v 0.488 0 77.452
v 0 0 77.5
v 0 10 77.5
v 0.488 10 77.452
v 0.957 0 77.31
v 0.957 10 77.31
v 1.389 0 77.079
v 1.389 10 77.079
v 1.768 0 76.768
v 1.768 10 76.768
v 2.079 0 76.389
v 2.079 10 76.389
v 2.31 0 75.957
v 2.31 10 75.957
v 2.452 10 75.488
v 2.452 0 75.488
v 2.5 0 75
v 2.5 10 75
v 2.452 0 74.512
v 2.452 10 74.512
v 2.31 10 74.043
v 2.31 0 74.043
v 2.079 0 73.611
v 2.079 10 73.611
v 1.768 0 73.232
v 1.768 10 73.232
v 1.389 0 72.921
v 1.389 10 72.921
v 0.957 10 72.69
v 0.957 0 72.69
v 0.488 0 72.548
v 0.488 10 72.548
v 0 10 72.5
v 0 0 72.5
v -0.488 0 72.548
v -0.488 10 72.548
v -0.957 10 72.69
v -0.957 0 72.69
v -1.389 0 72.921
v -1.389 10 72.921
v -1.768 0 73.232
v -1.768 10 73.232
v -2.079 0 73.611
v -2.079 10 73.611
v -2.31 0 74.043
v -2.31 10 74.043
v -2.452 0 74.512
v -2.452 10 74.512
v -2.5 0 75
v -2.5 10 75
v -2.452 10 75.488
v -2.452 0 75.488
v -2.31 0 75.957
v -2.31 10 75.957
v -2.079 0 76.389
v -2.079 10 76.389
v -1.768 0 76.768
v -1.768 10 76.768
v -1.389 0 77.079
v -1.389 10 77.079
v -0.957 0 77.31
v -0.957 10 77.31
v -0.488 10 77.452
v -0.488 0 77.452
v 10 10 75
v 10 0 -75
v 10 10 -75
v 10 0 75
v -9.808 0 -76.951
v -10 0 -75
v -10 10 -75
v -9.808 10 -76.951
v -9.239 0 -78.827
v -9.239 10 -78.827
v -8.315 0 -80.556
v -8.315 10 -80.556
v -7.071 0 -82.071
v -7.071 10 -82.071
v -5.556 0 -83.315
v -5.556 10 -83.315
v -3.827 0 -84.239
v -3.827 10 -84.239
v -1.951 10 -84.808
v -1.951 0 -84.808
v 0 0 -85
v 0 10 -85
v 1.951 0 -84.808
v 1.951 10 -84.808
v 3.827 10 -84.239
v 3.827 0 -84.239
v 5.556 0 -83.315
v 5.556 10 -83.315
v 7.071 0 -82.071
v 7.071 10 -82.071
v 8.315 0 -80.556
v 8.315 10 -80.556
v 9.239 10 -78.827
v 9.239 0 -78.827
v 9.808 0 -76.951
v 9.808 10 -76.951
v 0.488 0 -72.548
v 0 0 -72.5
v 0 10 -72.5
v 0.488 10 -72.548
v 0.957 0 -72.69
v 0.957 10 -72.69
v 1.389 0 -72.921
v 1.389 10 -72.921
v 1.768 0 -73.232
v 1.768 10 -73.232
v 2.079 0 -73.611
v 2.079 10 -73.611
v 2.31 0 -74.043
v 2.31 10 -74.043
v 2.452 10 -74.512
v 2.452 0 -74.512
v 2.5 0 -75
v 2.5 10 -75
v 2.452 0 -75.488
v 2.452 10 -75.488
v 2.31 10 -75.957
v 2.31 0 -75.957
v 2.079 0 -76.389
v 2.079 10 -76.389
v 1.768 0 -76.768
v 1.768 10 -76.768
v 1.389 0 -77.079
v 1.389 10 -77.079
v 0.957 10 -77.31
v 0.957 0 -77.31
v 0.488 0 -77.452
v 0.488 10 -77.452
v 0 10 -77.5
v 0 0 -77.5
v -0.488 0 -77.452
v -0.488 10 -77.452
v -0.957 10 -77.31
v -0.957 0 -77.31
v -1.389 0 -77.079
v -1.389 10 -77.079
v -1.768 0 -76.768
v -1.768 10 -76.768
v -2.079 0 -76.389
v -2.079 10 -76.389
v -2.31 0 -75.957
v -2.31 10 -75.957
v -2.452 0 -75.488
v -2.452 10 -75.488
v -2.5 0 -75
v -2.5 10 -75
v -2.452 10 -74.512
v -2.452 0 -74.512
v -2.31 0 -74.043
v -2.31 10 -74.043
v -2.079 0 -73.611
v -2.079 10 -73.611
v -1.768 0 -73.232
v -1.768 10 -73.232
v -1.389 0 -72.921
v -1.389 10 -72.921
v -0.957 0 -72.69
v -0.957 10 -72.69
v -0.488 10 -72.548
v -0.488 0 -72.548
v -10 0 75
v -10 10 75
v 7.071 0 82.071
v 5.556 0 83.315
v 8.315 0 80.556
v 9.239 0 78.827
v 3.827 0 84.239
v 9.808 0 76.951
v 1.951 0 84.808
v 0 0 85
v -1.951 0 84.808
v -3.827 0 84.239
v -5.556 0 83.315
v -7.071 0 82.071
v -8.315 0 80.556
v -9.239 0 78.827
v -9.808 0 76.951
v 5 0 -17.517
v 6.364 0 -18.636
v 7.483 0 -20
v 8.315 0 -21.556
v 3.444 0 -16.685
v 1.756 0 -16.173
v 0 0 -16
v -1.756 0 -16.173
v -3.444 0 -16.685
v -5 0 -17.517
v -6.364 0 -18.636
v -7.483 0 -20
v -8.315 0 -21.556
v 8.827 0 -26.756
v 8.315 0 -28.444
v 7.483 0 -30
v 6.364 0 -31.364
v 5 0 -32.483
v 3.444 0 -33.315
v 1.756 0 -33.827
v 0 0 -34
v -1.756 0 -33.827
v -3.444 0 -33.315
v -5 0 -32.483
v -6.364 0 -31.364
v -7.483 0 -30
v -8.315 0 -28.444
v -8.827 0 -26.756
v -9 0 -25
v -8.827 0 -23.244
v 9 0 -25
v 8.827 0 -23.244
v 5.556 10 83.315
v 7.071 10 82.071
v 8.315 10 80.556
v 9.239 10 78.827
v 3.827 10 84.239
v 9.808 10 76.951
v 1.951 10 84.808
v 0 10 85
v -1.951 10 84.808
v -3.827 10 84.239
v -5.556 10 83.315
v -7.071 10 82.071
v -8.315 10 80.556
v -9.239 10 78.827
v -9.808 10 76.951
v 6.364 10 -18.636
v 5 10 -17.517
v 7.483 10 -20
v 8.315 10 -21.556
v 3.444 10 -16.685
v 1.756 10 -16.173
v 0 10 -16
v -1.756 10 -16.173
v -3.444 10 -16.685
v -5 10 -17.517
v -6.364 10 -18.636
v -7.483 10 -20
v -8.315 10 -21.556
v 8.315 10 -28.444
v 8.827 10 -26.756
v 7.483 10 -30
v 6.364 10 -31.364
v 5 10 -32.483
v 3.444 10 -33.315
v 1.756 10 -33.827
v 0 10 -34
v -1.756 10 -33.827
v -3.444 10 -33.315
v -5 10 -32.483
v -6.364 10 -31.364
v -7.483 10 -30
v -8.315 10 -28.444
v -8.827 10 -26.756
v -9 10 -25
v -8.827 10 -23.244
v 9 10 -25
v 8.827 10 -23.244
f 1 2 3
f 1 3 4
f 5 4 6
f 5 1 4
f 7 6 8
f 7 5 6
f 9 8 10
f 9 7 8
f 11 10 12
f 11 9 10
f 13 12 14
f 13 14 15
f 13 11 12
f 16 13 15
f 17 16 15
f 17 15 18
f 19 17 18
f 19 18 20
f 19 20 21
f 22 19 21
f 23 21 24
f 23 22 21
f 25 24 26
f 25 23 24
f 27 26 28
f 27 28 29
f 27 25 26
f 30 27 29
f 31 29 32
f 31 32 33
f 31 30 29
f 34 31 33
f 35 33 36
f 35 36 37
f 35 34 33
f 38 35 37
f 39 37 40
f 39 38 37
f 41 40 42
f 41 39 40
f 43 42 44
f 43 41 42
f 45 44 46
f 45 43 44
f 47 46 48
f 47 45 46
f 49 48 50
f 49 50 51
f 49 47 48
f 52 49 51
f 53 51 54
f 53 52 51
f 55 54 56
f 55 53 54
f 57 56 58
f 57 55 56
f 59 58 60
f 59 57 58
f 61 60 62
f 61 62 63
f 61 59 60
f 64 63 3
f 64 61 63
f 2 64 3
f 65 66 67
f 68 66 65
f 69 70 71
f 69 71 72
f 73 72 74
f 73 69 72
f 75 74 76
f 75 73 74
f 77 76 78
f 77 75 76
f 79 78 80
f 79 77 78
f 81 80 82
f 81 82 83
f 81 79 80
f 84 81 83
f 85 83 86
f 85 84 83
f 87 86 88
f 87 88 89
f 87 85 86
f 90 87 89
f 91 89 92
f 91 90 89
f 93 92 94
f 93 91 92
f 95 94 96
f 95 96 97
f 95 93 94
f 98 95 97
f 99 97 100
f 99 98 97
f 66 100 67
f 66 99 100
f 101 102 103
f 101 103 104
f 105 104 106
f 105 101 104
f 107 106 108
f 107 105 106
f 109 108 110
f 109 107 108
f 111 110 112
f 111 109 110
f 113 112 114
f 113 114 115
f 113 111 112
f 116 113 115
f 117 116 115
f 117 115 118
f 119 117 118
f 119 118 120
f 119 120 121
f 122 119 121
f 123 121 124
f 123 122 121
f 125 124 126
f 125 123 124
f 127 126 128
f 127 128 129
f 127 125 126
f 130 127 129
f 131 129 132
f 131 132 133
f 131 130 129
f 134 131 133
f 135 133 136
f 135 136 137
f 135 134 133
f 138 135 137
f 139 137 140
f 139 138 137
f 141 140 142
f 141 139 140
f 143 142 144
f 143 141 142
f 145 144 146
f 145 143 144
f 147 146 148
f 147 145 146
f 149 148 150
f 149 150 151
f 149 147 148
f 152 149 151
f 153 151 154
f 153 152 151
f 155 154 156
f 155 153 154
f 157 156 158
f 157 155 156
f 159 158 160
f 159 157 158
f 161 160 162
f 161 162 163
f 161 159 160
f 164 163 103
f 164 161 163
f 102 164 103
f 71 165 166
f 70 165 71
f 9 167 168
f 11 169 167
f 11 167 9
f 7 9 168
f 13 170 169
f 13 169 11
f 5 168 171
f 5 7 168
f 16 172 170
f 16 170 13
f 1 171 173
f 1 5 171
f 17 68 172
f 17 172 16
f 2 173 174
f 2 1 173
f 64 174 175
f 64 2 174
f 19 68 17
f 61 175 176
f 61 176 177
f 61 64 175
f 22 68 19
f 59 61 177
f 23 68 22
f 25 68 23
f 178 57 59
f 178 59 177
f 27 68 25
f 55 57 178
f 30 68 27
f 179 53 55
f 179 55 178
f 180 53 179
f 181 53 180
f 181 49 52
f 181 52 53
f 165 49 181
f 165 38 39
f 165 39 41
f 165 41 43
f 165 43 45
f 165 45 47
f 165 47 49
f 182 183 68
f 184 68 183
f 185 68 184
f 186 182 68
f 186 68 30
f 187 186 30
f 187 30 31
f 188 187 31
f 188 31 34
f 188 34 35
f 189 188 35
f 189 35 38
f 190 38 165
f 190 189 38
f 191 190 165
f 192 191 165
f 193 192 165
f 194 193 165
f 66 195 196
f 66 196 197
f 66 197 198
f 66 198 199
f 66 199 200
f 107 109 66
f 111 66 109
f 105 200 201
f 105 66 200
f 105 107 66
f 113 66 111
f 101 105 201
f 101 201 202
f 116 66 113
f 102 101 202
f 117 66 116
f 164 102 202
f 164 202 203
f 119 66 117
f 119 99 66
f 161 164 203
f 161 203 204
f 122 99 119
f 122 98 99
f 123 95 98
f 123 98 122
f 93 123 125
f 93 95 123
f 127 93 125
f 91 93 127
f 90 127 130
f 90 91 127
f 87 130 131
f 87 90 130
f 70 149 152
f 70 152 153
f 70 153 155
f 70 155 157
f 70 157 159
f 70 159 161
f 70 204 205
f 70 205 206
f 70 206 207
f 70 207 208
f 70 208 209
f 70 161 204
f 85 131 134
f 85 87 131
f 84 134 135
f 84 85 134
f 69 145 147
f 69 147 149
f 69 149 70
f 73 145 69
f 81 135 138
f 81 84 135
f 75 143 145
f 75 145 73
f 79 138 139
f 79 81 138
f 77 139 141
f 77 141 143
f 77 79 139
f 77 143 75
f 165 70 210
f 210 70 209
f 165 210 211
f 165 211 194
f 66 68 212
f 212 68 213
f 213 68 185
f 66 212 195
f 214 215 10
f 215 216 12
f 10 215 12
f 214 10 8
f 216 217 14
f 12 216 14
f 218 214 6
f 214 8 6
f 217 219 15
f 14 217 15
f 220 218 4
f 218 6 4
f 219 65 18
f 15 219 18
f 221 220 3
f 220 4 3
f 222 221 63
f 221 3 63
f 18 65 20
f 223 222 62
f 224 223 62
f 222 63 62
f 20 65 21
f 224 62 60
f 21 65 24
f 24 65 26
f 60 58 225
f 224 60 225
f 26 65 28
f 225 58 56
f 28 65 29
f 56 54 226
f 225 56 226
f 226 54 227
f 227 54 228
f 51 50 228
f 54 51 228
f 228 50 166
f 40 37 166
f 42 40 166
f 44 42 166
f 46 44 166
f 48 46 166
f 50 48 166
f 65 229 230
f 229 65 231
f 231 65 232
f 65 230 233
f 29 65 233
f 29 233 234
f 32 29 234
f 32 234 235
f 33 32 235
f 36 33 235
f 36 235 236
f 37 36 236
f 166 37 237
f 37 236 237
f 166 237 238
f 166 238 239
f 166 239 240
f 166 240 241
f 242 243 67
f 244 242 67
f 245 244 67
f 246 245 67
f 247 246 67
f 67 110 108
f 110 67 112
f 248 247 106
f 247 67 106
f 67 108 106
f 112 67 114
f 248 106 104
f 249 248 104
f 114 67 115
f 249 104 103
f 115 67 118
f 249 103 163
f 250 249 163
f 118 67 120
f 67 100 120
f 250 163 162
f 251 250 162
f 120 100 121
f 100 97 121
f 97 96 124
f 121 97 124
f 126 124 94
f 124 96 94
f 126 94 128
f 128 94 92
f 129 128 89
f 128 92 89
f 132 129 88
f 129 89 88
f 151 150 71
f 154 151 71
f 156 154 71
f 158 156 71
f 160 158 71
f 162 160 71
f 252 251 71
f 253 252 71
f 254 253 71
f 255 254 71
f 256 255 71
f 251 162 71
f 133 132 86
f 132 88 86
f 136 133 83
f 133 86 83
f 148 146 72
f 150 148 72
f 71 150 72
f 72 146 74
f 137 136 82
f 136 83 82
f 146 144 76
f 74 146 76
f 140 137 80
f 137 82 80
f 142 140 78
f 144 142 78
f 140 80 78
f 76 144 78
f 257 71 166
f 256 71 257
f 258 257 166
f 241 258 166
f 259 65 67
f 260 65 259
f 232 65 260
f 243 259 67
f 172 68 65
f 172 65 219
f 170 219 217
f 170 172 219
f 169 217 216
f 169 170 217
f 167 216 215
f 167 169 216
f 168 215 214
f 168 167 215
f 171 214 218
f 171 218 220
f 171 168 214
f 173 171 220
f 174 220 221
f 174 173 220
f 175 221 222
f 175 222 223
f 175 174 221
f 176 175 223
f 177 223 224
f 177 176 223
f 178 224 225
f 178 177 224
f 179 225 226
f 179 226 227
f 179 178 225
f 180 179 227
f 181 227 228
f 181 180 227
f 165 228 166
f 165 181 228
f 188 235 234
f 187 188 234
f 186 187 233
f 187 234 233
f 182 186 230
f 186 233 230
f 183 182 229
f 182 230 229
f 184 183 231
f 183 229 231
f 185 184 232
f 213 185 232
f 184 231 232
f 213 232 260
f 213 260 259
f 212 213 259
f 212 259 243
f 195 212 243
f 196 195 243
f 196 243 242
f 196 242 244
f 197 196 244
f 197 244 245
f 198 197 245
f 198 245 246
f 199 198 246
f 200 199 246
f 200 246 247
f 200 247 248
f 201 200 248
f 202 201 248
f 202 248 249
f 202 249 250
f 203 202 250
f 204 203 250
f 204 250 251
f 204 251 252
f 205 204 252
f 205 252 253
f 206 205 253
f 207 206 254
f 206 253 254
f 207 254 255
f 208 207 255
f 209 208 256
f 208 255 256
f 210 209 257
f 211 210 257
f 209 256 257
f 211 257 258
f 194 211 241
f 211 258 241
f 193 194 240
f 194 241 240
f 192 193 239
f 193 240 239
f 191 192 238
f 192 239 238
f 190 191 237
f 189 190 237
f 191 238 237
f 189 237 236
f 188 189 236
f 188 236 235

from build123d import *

# Parameters (mm, degrees)
SKETCH1_R            = 2.5
BOSS_EXTRUDE1_DEPTH  = 10
SKETCH2_R            = 9
MOTORMOUNTBORE_DEPTH = 87.168439698


with BuildPart() as part:
    # Sketch1 → Boss-Extrude1 (new body)
    with BuildSketch(Plane(origin=(0, 0, 0), x_dir=(1, 0, 0), z_dir=(0, 1, 0))):
        with BuildLine():
            Line((-10, -75), (-10, 75))
            ThreePointArc((-10, 75), (0, 85), (10, 75))
            Line((10, 75), (10, -75))
            ThreePointArc((10, -75), (0, -85), (-10, -75))
        make_face()
        with Locations(Location((0, 75, 0), (0, 0, 270))):
            Circle(SKETCH1_R, mode=Mode.SUBTRACT)
        with Locations(Location((0, -75, 0), (0, 0, 270))):
            Circle(SKETCH1_R, mode=Mode.SUBTRACT)
    extrude(amount=BOSS_EXTRUDE1_DEPTH)

    # Sketch2 → MotorMountBore (cut, through all)
    with BuildSketch(Plane(origin=(0, 10, 0), x_dir=(1, 0, 0), z_dir=(0, 1, 0))):
        with Locations(Location((0, 25, 0), (0, 0, 270))):
            Circle(SKETCH2_R)
    extrude(amount=-MOTORMOUNTBORE_DEPTH, mode=Mode.SUBTRACT)


solid = part.part
